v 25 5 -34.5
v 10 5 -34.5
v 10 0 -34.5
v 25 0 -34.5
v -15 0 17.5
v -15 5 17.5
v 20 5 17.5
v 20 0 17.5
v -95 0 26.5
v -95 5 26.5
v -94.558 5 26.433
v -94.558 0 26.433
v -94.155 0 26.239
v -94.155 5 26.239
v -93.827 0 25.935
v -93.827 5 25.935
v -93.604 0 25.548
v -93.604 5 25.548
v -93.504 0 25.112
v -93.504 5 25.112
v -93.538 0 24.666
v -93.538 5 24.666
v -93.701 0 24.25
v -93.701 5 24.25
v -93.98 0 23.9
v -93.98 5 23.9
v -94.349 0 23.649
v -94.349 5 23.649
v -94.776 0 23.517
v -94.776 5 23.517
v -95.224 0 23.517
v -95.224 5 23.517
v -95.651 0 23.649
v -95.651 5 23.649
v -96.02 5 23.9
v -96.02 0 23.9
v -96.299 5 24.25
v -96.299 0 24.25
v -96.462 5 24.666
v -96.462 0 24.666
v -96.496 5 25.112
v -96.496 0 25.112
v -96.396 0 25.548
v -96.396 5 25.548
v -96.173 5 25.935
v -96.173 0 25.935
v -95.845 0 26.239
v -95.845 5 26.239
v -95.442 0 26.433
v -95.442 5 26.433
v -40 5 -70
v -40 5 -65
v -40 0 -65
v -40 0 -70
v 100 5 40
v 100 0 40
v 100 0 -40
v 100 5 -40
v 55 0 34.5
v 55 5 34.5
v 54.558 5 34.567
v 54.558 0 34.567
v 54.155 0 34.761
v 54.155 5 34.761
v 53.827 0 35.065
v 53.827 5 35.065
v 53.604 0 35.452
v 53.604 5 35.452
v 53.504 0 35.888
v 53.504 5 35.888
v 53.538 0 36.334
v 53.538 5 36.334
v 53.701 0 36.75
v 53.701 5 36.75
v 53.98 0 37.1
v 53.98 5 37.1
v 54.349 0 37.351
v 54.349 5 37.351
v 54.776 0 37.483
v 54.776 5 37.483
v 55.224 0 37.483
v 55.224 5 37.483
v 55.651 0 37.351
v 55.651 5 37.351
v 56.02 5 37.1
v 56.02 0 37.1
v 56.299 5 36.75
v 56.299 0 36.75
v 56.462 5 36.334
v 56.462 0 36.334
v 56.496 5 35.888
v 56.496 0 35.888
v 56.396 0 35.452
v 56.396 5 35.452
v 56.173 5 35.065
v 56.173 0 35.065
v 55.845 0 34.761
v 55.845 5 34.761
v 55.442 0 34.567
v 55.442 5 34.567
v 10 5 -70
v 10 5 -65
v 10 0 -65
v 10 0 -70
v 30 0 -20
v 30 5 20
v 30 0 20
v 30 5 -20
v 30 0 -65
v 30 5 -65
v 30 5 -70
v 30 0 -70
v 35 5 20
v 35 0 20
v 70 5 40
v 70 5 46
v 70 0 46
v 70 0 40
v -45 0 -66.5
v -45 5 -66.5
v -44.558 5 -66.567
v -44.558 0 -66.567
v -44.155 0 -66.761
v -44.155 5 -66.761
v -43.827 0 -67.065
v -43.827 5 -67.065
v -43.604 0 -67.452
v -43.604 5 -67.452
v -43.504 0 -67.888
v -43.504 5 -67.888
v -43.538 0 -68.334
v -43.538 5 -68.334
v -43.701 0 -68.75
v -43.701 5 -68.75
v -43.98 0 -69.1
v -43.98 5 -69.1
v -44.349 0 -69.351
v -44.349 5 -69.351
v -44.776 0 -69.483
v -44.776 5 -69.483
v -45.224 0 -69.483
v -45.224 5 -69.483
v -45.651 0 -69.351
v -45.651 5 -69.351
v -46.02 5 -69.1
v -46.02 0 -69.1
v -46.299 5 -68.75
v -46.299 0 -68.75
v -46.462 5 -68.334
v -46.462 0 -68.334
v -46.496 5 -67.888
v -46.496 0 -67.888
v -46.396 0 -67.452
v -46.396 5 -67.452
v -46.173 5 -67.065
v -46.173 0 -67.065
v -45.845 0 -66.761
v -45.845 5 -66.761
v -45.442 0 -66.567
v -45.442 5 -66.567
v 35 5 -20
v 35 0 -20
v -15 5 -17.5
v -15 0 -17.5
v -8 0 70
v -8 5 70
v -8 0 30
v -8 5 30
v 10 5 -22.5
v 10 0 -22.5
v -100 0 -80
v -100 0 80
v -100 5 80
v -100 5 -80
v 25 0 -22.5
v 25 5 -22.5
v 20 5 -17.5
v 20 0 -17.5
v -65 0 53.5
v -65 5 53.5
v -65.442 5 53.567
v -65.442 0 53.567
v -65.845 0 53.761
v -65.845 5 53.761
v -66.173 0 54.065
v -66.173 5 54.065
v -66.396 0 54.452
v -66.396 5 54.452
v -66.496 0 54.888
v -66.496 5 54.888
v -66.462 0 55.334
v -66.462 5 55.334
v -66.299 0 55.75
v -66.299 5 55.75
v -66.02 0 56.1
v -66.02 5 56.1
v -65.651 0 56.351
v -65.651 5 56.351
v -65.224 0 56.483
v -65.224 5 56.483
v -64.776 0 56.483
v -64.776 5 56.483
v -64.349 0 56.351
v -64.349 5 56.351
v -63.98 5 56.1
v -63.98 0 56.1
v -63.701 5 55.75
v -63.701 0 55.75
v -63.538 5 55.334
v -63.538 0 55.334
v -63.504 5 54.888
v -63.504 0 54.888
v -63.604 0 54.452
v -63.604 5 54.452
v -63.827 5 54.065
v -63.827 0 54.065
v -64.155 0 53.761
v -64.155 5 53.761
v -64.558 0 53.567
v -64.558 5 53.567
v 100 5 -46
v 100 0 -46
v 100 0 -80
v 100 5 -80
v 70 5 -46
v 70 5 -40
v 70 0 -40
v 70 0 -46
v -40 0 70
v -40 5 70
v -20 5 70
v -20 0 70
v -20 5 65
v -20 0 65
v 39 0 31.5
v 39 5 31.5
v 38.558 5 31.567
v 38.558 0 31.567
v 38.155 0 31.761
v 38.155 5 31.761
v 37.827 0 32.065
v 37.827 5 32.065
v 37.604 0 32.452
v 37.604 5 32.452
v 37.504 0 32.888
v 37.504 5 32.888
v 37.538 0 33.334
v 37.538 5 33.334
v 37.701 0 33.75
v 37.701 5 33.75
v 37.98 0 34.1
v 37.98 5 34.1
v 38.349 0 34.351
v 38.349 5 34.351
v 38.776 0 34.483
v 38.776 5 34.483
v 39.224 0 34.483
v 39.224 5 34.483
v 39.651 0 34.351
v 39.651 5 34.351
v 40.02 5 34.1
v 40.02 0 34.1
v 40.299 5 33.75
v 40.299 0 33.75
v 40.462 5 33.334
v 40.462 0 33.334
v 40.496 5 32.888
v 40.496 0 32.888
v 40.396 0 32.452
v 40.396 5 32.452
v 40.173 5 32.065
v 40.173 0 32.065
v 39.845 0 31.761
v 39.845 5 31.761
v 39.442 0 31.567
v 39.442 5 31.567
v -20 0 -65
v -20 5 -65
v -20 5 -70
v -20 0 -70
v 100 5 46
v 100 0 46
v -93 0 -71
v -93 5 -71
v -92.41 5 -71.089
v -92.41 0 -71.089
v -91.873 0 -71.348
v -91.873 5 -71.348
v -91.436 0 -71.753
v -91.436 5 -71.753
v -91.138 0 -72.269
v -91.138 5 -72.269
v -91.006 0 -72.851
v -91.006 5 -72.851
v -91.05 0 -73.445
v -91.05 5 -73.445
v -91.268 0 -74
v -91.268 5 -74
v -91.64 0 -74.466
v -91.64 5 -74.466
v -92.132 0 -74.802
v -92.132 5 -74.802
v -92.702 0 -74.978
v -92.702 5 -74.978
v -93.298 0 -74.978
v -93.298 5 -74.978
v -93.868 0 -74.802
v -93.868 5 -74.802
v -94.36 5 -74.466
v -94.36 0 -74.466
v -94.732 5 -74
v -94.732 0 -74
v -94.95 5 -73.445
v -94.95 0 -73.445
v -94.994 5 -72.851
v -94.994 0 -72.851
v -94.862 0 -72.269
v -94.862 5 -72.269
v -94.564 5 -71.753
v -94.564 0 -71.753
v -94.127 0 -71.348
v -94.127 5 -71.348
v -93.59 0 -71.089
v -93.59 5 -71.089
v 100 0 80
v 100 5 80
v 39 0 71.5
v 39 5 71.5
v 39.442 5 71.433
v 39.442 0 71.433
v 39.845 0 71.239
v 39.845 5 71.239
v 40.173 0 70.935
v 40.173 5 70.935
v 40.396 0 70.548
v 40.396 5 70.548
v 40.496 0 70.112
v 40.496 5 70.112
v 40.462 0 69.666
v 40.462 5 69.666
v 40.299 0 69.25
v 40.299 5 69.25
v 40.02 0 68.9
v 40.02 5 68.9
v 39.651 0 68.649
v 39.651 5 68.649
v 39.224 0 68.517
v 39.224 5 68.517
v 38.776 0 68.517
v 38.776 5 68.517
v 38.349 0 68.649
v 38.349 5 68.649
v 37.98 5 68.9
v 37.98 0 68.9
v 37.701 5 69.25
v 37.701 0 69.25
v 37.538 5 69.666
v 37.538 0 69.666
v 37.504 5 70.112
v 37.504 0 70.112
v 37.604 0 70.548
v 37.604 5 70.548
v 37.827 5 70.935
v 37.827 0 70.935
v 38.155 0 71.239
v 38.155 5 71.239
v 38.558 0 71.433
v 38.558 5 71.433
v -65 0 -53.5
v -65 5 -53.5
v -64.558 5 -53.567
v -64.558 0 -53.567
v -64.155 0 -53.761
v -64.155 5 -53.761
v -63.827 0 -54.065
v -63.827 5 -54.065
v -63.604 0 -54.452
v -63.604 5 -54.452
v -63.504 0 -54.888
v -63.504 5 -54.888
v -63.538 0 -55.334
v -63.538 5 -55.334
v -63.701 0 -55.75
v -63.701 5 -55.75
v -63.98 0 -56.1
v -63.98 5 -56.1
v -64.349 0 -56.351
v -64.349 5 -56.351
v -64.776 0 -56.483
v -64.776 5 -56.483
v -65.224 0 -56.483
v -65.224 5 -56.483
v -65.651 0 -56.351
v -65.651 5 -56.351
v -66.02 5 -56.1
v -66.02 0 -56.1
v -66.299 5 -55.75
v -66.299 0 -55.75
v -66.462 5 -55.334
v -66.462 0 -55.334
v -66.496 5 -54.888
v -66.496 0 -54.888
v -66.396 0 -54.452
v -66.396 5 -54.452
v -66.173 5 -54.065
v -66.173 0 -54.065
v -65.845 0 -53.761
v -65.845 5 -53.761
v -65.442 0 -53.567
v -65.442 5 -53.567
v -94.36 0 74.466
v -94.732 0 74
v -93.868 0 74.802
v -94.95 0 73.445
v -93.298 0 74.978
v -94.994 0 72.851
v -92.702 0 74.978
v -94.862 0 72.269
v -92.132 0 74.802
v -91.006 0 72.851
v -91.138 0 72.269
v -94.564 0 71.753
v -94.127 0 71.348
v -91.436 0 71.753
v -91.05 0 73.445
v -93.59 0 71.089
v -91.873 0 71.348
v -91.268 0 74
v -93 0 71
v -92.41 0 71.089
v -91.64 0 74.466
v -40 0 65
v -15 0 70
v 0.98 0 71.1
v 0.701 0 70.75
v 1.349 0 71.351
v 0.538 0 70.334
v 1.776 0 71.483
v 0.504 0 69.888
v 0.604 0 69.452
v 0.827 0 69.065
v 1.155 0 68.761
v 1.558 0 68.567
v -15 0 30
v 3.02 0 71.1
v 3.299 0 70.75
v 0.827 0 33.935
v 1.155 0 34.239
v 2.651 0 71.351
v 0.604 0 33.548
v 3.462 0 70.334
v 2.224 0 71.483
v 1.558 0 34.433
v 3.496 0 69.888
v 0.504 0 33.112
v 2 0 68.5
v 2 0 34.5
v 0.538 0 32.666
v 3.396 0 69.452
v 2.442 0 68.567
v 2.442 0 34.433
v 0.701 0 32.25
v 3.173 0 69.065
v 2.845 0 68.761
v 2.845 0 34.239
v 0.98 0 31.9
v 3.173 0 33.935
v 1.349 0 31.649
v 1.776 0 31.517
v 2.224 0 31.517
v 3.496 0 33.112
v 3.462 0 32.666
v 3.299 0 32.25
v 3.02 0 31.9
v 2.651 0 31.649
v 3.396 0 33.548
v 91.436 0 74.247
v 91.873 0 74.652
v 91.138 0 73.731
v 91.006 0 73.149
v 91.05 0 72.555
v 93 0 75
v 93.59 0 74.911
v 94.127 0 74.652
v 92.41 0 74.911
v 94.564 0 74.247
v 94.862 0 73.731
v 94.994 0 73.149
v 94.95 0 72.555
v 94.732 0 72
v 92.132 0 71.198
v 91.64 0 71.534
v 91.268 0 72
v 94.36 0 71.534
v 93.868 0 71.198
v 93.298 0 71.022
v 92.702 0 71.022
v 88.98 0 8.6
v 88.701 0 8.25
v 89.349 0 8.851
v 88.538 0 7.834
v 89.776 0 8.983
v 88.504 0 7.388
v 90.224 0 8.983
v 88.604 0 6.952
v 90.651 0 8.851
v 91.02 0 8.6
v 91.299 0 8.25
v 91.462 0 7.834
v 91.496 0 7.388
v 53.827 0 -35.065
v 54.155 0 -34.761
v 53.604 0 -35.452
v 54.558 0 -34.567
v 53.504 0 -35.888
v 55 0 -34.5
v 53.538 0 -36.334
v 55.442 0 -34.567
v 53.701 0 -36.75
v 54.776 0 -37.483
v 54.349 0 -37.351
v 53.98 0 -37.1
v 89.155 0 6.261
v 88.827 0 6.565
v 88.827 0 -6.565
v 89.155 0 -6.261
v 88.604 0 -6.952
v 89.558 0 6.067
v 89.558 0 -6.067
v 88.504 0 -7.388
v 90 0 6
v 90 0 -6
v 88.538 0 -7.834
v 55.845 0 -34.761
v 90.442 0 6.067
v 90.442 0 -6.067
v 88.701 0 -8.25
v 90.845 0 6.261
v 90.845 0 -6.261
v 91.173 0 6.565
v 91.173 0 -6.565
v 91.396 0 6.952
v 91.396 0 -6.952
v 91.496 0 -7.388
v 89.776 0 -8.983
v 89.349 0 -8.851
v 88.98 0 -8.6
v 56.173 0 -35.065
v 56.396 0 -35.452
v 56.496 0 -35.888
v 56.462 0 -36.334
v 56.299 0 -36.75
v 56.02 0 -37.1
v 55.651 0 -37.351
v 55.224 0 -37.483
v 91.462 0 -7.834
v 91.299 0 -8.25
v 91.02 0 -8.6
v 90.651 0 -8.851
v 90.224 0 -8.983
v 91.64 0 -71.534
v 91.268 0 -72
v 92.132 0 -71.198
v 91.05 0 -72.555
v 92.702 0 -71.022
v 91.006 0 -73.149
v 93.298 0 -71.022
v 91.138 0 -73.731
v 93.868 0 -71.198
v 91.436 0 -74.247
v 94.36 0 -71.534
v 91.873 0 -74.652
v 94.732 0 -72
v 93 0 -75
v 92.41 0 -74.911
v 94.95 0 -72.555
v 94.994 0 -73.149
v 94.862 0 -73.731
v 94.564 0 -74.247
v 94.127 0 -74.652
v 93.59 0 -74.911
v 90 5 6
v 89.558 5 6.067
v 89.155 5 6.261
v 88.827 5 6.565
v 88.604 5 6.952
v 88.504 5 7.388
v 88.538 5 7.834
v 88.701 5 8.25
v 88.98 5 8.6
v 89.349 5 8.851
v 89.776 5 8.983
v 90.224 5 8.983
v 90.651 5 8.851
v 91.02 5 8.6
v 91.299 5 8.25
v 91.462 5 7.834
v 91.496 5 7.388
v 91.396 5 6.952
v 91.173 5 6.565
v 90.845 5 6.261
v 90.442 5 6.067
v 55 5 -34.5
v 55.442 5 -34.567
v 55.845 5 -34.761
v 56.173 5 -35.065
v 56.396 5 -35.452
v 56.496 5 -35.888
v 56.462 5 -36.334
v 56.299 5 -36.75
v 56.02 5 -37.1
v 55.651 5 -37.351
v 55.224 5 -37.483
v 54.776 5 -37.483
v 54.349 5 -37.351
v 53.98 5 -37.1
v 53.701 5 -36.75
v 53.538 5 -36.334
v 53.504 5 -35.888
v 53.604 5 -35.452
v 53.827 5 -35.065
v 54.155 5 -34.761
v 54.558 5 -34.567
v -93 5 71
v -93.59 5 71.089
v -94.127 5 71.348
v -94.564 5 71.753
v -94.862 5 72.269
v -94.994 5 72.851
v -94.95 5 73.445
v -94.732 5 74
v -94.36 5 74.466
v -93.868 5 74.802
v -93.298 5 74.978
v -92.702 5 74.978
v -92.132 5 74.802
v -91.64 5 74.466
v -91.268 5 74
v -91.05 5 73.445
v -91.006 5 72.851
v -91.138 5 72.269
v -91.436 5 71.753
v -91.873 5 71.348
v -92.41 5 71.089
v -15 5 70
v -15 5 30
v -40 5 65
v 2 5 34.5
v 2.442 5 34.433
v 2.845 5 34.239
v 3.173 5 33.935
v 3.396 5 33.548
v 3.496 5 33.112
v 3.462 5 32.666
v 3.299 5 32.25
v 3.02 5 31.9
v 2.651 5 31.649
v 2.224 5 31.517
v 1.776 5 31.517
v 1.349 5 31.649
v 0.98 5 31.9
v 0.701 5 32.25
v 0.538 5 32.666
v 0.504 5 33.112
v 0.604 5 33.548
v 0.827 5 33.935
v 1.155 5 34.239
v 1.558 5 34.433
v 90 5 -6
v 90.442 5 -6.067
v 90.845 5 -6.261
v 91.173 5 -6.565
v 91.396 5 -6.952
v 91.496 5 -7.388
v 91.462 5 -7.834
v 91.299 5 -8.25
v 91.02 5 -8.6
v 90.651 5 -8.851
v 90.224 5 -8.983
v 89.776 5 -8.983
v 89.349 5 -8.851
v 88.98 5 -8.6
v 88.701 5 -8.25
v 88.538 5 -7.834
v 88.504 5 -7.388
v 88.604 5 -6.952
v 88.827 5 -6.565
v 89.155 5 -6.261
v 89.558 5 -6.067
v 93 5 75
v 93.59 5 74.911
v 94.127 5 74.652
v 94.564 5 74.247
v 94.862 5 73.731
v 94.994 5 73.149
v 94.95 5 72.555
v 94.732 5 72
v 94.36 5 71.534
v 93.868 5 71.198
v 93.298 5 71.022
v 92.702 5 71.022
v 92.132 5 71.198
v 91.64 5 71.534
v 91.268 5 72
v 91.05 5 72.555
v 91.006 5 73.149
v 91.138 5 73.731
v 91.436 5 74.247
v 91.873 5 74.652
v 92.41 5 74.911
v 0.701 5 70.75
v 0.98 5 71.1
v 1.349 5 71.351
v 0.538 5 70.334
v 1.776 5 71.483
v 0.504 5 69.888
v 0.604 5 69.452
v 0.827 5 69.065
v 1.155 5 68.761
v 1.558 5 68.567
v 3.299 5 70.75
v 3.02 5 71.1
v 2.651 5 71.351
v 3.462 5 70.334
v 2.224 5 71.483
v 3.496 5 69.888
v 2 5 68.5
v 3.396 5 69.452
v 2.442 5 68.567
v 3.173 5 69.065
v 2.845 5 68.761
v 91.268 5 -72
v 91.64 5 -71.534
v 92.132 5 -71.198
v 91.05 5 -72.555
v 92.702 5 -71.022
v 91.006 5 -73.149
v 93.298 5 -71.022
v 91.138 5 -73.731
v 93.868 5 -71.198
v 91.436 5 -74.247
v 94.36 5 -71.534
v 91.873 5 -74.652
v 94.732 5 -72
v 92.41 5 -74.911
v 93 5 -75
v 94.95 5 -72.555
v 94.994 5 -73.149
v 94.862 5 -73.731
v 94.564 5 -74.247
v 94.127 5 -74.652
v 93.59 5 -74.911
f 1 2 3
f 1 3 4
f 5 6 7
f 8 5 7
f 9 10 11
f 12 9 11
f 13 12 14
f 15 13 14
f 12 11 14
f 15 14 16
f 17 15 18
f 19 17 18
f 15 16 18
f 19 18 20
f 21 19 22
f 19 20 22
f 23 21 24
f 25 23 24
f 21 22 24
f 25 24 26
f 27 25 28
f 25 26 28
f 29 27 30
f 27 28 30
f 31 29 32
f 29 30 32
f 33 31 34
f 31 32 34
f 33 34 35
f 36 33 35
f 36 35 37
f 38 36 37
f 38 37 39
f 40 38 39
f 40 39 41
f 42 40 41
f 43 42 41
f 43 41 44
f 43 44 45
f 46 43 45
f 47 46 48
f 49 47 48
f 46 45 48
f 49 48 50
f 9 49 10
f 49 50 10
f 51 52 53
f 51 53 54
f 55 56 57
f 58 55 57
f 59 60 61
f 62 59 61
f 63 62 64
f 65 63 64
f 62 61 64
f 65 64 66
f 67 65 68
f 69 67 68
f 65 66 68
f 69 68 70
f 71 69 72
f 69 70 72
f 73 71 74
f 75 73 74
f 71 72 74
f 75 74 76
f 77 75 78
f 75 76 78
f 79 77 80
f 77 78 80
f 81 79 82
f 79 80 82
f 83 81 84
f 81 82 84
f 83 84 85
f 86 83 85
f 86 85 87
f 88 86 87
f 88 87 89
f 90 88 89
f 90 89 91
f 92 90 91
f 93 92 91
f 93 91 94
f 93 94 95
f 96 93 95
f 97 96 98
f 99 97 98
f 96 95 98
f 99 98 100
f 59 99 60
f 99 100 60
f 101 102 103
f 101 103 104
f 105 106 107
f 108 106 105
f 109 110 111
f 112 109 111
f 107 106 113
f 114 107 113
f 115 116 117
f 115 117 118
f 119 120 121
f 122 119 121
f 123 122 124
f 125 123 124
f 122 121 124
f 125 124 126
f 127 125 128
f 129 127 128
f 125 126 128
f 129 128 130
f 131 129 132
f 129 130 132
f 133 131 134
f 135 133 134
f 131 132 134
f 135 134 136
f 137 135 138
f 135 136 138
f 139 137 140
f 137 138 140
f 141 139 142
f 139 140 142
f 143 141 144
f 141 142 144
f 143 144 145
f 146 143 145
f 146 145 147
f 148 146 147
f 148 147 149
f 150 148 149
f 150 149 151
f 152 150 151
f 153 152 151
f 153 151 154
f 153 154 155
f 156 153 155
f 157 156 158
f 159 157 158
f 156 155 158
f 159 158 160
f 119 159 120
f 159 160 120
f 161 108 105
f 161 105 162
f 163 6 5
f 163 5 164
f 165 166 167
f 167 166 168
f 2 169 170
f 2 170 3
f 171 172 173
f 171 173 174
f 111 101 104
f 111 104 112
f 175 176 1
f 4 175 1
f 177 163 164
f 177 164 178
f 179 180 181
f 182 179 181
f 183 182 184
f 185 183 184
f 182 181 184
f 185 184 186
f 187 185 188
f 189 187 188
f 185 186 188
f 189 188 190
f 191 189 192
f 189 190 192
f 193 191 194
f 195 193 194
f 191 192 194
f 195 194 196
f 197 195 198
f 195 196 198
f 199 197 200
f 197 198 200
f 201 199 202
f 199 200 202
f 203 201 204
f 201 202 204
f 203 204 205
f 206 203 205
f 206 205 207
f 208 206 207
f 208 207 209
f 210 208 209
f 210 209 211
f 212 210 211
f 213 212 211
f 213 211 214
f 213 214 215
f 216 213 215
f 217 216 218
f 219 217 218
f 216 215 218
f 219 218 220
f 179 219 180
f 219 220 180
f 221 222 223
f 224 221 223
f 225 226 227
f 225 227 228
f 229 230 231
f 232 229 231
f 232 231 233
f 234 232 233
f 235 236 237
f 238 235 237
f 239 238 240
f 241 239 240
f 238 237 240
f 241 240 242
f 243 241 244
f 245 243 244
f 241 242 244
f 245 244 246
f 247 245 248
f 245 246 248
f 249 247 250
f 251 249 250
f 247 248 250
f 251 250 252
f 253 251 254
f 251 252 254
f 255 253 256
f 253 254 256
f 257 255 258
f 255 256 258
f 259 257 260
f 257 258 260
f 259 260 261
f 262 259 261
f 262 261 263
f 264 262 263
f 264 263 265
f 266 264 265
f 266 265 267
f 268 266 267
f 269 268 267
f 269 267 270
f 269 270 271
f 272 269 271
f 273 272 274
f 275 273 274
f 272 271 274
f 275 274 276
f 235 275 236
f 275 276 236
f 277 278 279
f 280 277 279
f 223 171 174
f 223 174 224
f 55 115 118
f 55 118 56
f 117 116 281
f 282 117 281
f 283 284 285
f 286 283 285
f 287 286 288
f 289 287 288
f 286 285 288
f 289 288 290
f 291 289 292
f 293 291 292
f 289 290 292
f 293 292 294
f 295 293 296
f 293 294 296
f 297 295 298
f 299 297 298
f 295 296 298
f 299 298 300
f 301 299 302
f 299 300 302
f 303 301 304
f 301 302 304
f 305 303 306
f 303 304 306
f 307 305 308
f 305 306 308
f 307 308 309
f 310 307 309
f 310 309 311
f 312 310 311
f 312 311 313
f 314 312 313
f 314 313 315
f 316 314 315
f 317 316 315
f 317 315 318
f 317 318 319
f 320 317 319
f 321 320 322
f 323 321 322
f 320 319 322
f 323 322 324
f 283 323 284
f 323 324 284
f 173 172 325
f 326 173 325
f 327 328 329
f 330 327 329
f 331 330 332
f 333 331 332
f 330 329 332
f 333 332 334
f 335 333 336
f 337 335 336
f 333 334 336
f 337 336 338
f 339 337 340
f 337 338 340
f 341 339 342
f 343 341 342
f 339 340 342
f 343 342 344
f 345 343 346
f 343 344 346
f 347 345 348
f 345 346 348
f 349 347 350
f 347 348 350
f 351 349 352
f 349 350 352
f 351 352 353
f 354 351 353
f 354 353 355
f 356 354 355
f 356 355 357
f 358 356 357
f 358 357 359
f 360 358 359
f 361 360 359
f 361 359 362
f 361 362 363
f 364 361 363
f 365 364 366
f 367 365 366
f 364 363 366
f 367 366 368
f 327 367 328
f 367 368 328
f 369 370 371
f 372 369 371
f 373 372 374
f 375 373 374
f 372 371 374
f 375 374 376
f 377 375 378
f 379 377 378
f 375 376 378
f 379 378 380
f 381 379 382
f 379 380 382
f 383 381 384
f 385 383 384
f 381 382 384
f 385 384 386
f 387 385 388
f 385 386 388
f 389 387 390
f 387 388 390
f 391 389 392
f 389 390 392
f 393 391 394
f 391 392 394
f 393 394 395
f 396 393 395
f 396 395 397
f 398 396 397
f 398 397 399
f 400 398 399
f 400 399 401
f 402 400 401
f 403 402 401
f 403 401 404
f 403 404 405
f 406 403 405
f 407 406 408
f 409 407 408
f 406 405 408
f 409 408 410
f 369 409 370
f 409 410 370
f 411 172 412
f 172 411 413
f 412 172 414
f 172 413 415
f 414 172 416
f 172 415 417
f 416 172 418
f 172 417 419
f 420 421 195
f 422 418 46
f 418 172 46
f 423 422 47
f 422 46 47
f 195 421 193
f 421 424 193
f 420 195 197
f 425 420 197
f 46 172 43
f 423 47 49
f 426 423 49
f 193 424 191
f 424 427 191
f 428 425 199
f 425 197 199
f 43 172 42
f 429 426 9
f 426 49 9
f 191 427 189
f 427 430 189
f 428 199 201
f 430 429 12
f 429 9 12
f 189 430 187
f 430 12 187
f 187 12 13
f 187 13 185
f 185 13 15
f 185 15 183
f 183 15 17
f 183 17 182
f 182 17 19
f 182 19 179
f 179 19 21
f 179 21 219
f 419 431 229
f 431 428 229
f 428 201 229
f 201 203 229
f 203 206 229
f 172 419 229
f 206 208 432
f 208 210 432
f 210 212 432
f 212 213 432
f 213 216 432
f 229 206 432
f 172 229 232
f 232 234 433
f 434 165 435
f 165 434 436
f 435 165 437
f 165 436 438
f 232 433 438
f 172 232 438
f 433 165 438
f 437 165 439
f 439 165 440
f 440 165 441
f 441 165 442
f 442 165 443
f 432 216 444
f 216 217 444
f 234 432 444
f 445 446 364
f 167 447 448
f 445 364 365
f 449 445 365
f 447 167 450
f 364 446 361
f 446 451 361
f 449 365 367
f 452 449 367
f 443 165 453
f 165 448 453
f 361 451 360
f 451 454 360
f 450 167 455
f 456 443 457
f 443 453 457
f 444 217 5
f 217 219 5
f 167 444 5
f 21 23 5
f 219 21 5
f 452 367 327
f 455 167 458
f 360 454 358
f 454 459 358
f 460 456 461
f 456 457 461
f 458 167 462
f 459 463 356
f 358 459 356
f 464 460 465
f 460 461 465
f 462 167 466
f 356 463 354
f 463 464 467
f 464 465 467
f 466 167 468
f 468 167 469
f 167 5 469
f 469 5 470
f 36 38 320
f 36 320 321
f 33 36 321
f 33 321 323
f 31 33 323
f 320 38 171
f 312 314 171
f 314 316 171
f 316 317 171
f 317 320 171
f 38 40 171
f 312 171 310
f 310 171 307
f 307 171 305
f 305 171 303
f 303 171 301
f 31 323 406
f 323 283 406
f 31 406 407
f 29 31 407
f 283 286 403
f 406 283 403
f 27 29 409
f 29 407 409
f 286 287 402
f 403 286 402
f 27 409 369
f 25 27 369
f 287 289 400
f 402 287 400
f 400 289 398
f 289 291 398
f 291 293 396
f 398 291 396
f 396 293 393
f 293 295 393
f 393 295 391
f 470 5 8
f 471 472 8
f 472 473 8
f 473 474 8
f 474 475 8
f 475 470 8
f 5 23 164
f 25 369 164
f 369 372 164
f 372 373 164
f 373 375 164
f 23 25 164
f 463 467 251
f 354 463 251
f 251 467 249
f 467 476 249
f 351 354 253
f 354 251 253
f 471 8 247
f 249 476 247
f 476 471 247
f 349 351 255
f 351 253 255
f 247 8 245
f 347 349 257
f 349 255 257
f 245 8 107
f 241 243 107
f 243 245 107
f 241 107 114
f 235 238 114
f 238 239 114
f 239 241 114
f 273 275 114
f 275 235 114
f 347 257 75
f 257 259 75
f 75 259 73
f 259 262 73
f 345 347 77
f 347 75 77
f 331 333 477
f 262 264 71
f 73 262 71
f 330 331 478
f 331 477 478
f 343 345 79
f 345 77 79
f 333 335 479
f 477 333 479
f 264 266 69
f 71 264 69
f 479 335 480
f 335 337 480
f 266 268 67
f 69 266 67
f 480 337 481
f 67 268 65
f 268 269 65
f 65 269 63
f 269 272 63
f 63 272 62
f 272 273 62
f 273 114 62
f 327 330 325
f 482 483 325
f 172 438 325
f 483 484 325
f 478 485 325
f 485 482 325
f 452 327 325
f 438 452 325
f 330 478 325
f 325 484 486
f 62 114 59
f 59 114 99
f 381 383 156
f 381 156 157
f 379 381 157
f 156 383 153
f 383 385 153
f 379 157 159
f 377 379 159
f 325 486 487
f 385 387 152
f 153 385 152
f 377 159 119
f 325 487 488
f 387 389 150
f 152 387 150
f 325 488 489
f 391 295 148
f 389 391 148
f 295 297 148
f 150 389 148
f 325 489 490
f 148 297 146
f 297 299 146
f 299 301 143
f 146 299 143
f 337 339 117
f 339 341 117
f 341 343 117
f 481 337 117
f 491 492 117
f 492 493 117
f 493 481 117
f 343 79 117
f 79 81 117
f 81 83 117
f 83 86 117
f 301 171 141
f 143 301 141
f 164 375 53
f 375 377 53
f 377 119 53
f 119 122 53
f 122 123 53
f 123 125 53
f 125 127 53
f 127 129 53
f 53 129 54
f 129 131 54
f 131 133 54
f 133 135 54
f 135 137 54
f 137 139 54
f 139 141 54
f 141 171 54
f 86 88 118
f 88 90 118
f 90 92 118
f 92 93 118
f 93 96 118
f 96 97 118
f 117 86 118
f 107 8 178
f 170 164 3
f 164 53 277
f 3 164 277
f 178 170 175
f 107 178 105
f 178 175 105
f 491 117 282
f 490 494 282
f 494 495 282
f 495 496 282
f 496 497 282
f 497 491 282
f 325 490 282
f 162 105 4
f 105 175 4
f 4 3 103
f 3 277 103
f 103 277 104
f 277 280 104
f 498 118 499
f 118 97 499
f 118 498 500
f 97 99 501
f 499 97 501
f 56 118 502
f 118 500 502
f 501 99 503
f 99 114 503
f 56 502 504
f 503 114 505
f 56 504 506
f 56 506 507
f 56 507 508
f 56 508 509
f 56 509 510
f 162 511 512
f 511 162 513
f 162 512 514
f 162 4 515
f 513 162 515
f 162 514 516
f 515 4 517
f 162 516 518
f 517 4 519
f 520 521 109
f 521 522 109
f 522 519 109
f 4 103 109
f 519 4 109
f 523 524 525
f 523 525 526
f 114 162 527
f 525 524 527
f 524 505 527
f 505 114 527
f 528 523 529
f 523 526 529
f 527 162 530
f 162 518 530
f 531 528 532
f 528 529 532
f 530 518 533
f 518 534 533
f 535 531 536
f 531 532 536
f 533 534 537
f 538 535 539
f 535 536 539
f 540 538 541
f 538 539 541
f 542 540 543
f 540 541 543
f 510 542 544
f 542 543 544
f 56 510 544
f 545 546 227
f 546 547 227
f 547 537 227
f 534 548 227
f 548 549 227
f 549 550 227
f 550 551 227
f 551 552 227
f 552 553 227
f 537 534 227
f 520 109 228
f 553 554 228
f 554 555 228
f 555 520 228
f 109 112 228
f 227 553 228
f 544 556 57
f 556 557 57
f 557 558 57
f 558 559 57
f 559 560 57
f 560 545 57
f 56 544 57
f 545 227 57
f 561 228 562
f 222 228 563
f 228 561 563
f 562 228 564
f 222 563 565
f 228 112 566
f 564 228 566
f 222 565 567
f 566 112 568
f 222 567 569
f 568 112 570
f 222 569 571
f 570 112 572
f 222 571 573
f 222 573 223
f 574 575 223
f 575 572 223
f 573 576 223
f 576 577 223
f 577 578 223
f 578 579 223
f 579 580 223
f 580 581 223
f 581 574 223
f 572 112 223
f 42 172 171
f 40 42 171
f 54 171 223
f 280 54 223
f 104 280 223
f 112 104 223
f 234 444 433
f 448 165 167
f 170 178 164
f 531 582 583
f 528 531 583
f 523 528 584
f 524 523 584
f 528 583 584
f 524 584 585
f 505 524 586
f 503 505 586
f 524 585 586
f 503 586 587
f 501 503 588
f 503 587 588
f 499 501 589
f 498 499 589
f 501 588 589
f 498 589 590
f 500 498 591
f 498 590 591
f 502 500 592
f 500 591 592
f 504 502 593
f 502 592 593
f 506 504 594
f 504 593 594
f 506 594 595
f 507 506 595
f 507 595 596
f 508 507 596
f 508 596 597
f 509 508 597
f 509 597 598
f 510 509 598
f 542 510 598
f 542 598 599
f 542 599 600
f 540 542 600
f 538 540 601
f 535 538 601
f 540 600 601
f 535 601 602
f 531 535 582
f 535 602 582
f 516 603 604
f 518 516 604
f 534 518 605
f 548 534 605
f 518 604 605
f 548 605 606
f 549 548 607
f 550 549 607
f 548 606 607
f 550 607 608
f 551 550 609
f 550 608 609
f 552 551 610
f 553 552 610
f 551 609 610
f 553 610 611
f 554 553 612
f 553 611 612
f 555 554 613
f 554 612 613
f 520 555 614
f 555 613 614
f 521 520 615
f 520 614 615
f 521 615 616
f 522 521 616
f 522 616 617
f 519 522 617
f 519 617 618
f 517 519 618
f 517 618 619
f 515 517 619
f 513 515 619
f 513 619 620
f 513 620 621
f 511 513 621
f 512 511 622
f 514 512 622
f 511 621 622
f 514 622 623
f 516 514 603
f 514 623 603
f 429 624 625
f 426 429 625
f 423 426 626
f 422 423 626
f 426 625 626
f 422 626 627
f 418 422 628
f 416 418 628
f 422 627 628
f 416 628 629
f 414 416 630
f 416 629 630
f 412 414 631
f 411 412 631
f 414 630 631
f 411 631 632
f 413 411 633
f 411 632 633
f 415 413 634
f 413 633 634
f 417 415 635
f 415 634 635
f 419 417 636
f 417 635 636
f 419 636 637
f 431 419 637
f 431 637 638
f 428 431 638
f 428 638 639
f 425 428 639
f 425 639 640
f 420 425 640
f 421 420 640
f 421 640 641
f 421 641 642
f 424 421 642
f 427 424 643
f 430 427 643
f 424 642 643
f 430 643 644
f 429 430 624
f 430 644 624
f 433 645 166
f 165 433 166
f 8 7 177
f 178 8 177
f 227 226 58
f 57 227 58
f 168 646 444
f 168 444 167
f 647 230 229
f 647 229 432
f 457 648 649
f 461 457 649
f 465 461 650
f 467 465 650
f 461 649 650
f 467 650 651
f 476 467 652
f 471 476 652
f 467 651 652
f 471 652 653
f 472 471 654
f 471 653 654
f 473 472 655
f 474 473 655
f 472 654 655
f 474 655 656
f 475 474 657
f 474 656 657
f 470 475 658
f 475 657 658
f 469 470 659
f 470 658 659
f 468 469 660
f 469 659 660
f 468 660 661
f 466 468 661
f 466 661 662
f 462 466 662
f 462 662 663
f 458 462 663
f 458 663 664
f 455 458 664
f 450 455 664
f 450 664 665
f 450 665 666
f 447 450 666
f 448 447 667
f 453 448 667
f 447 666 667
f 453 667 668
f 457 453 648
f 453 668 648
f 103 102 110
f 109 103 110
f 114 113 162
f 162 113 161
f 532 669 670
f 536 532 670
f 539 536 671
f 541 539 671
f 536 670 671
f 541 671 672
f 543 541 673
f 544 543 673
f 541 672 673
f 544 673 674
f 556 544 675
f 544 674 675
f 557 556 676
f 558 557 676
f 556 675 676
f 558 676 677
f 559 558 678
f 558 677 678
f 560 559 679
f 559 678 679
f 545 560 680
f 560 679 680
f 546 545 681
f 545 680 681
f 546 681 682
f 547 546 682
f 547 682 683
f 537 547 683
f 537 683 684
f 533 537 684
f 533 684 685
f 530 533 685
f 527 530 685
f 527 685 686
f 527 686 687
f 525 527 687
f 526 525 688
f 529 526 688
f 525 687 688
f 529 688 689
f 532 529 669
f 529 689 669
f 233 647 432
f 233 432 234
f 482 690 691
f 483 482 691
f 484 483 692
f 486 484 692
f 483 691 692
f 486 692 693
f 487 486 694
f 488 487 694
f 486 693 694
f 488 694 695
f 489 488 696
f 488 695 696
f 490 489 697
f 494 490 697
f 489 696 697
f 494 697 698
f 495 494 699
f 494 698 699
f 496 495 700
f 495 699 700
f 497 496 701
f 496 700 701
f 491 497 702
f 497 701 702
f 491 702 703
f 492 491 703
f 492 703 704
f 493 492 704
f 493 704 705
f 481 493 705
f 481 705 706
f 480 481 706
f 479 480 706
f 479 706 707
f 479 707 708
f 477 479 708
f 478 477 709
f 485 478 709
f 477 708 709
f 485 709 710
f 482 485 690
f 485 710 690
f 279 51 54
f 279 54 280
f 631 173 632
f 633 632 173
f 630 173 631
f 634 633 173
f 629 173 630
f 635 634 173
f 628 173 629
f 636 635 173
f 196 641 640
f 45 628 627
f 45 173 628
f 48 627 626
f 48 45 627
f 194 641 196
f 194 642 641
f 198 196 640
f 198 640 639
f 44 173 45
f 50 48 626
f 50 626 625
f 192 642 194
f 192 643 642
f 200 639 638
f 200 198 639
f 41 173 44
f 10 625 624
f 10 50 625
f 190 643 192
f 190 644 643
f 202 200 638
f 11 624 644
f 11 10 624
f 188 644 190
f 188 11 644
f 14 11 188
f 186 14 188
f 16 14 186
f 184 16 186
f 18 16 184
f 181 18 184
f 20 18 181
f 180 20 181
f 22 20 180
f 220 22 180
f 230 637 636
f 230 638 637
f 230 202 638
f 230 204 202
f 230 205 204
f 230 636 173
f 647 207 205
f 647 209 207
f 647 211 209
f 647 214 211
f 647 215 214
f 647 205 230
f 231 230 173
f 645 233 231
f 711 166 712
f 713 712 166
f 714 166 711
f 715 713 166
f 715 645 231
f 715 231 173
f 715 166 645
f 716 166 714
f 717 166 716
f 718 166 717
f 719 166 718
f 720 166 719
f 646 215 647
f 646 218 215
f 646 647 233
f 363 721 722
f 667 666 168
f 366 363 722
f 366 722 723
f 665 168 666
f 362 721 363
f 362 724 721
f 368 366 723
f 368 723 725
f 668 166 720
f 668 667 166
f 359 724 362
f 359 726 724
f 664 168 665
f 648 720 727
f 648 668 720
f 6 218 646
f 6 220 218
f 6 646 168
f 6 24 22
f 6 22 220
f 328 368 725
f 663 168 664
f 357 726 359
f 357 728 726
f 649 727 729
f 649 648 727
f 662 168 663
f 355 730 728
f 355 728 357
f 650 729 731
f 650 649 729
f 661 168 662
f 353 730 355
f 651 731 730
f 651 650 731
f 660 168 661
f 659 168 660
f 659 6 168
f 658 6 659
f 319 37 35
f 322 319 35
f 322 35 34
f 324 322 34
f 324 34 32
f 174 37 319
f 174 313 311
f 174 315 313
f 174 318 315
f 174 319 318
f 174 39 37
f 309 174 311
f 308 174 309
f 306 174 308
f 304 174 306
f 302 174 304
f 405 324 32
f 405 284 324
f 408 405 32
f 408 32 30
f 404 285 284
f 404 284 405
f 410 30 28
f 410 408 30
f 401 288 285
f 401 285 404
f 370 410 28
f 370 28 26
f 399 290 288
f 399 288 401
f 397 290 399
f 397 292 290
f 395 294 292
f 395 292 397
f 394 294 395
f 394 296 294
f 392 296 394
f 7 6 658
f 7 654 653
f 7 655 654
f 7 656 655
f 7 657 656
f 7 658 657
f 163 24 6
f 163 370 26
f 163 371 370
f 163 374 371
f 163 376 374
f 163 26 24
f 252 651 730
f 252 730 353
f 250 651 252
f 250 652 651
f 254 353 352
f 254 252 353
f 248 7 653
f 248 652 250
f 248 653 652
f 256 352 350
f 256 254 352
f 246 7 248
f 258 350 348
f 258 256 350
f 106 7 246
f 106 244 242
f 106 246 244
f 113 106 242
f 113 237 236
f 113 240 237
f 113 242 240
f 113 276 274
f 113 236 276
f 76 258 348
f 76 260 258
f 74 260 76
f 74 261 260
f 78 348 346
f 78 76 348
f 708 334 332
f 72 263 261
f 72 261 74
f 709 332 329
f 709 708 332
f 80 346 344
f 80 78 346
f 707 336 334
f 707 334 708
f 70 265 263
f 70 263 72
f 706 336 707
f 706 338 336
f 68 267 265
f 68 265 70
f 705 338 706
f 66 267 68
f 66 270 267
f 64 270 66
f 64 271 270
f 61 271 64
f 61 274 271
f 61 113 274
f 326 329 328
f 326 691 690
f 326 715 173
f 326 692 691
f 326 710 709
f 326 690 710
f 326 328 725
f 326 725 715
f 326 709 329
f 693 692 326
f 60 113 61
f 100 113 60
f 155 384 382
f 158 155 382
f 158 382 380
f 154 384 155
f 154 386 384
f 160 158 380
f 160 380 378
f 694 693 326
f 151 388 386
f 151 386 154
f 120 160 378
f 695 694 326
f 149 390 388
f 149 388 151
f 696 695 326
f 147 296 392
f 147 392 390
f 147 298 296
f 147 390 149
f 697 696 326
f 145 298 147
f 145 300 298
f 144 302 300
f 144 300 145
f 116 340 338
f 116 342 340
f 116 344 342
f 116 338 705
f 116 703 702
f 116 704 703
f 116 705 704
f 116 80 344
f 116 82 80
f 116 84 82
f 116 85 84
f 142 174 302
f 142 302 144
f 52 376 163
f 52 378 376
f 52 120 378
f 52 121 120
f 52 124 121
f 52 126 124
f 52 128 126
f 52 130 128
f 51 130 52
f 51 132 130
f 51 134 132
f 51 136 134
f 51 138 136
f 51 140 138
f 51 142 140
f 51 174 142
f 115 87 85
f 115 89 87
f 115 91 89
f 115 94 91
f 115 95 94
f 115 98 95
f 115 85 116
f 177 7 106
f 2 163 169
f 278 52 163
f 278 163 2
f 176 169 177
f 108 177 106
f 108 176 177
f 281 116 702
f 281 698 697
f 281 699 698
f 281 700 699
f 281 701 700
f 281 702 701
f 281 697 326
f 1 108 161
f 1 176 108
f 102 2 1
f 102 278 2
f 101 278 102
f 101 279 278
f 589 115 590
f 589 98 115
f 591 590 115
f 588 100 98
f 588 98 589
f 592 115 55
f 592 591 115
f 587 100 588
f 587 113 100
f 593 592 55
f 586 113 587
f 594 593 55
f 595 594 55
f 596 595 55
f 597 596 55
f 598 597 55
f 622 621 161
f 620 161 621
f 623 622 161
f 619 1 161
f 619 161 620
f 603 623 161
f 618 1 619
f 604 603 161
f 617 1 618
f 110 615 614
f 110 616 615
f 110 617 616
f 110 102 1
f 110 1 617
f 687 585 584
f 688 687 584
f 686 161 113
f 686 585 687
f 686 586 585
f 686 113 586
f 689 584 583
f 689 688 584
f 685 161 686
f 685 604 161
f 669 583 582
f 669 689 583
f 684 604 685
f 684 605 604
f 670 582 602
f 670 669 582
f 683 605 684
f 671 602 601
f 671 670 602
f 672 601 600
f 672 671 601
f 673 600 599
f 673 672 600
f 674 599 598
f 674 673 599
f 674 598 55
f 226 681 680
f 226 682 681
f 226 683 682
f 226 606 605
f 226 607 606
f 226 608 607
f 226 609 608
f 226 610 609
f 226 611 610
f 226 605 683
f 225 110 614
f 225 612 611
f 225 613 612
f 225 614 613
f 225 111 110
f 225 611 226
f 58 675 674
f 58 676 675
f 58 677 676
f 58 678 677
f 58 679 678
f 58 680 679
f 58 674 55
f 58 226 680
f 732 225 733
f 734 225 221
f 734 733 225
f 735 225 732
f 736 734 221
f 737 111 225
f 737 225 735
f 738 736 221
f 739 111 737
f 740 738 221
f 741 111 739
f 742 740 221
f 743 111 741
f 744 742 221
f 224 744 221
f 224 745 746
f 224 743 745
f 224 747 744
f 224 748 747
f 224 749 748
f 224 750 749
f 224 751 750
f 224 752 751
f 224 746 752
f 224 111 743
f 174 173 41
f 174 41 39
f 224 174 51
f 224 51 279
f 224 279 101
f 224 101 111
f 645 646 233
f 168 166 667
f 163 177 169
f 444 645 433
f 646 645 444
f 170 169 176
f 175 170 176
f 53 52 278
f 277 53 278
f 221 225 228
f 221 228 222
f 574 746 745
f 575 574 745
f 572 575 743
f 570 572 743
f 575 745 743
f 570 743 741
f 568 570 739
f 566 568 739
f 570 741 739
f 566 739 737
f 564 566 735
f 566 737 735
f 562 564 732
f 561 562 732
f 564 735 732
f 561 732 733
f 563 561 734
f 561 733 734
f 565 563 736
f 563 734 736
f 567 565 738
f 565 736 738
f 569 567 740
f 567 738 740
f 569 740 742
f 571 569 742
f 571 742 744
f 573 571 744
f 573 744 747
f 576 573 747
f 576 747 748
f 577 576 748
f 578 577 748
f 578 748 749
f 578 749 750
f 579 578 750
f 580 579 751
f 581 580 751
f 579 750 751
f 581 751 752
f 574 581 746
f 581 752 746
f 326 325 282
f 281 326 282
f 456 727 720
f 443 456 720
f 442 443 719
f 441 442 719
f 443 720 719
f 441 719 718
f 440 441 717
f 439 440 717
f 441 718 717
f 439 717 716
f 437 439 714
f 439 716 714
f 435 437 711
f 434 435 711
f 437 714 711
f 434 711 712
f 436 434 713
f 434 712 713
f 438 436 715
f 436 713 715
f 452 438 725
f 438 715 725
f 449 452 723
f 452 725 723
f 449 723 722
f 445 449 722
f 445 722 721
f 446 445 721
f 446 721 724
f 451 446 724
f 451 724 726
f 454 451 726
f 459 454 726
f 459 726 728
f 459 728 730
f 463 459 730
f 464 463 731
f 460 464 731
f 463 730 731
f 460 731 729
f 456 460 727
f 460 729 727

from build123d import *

# Parameters (mm, degrees)
SKETCH1_W           = 200
SKETCH1_H           = 160
BOSS_EXTRUDE1_DEPTH = 5
SKETCH2_R           = 2
CUT_EXTRUDE1_DEPTH  = 5
SKETCH3_R           = 1.5
CUT_EXTRUDE4_DEPTH  = 5
SKETCH4_R           = 1.5
CUT_EXTRUDE5_DEPTH  = 5
SKETCH5_W           = 35
SKETCH5_H           = 35
CUT_EXTRUDE6_DEPTH  = 5
SKETCH7_W           = 7
SKETCH7_H           = 40
SKETCH7_W_2         = 5
SKETCH7_W_3         = 20
SKETCH7_H_2         = 5
CUT_EXTRUDE7_DEPTH  = 5
SKETCH8_W           = 15
SKETCH8_H           = 12
SKETCH8_W_2         = 30
SKETCH8_H_2         = 6
CUT_EXTRUDE8_DEPTH  = 5
SKETCH9_W           = 20
SKETCH9_H           = 5
CUT_EXTRUDE9_DEPTH  = 5
SKETCH10_R          = 1.5
CUT_EXTRUDE10_DEPTH = 5
SKETCH11_R          = 1.5
CUT_EXTRUDE11_DEPTH = 5
SKETCH12_R          = 1.5
CUT_EXTRUDE12_DEPTH = 5


with BuildPart() as part:
    # Sketch1 → Boss-Extrude1 (new body)
    with BuildSketch(Plane(origin=(0, 0, 0), x_dir=(1, 0, 0), z_dir=(0, 1, 0))):
        Rectangle(SKETCH1_W, SKETCH1_H)
    extrude(amount=BOSS_EXTRUDE1_DEPTH)

    # Sketch2 → Cut-Extrude1 (cut)
    with BuildSketch(Plane(origin=(0, 5, 0), x_dir=(1, 0, 0), z_dir=(0, 1, 0))):
        with Locations(Location((-93, 73, 0), (0, 0, 270))):
            Circle(SKETCH2_R)
        with Locations(Location((93, 73, 0), (0, 0, 90))):
            Circle(SKETCH2_R)
        with Locations(Location((93, -73, 0), (0, 0, 270))):
            Circle(SKETCH2_R)
        with Locations(Location((-93, -73, 0), (0, 0, 90))):
            Circle(SKETCH2_R)
    extrude(amount=-CUT_EXTRUDE1_DEPTH, mode=Mode.SUBTRACT)

    # Sketch3 → Cut-Extrude4 (cut)
    with BuildSketch(Plane(origin=(0, 5, 0), x_dir=(1, 0, 0), z_dir=(0, 1, 0))):
        with Locations(Location((90, 7.5, 0), (0, 0, 270))):
            Circle(SKETCH3_R)
        with Locations(Location((90, -7.5, 0), (0, 0, 90))):
            Circle(SKETCH3_R)
    extrude(amount=-CUT_EXTRUDE4_DEPTH, mode=Mode.SUBTRACT)

    # Sketch4 → Cut-Extrude5 (cut)
    with BuildSketch(Plane(origin=(0, 5, 0), x_dir=(1, 0, 0), z_dir=(0, 1, 0))):
        with Locations(Location((55, 36, 0), (0, 0, 270))):
            Circle(SKETCH4_R)
        with Locations(Location((55, -36, 0), (0, 0, 90))):
            Circle(SKETCH4_R)
    extrude(amount=-CUT_EXTRUDE5_DEPTH, mode=Mode.SUBTRACT)

    # Sketch5 → Cut-Extrude6 (cut)
    with BuildSketch(Plane(origin=(0, 5, 0), x_dir=(1, 0, 0), z_dir=(0, 1, 0))):
        with Locations((2.5, 0)):
            Rectangle(SKETCH5_W, SKETCH5_H)
    extrude(amount=-CUT_EXTRUDE6_DEPTH, mode=Mode.SUBTRACT)

    # Sketch7 → Cut-Extrude7 (cut)
    with BuildSketch(Plane(origin=(0, 5, 0), x_dir=(1, 0, 0), z_dir=(0, 1, 0))):
        with Locations((-11.5, -50)):
            Rectangle(SKETCH7_W, SKETCH7_H)
        with Locations((32.5, 0)):
            Rectangle(SKETCH7_W_2, SKETCH7_H)
        with Locations((-30, 67.5)):
            Rectangle(SKETCH7_W_3, SKETCH7_H_2)
        with Locations((-30, -67.5)):
            Rectangle(SKETCH7_W_3, SKETCH7_H_2)
    extrude(amount=-CUT_EXTRUDE7_DEPTH, mode=Mode.SUBTRACT)

    # Sketch8 → Cut-Extrude8 (cut)
    with BuildSketch(Plane(origin=(0, 5, 0), x_dir=(1, 0, 0), z_dir=(0, 1, 0))):
        with Locations((17.5, 28.5)):
            Rectangle(SKETCH8_W, SKETCH8_H)
        with Locations((85, 43)):
            Rectangle(SKETCH8_W_2, SKETCH8_H_2)
        with Locations((85, -43)):
            Rectangle(SKETCH8_W_2, SKETCH8_H_2)
    extrude(amount=-CUT_EXTRUDE8_DEPTH, mode=Mode.SUBTRACT)

    # Sketch9 → Cut-Extrude9 (cut)
    with BuildSketch(Plane(origin=(0, 5, 0), x_dir=(1, 0, 0), z_dir=(0, 1, 0))):
        with Locations((20, 67.5)):
            Rectangle(SKETCH9_W, SKETCH9_H)
    extrude(amount=-CUT_EXTRUDE9_DEPTH, mode=Mode.SUBTRACT)

    # Sketch10 → Cut-Extrude10 (cut)
    with BuildSketch(Plane(origin=(0, 5, 0), x_dir=(1, 0, 0), z_dir=(0, 1, 0))):
        with Locations(Location((-95, -25, 0), (0, 0, 270))):
            Circle(SKETCH10_R)
        with Locations(Location((-45, 68, 0), (0, 0, 270))):
            Circle(SKETCH10_R)
    extrude(amount=-CUT_EXTRUDE10_DEPTH, mode=Mode.SUBTRACT)

    # Sketch11 → Cut-Extrude11 (cut)
    with BuildSketch(Plane(origin=(0, 5, 0), x_dir=(1, 0, 0), z_dir=(0, 1, 0))):
        with Locations(Location((2, -33, 0), (0, 0, 270))):
            Circle(SKETCH11_R)
        with Locations(Location((2, -70, 0), (0, 0, 90))):
            Circle(SKETCH11_R)
        with Locations(Location((39, -70, 0), (0, 0, 270))):
            Circle(SKETCH11_R)
        with Locations(Location((39, -33, 0), (0, 0, 90))):
            Circle(SKETCH11_R)
    extrude(amount=-CUT_EXTRUDE11_DEPTH, mode=Mode.SUBTRACT)

    # Sketch12 → Cut-Extrude12 (cut)
    with BuildSketch(Plane(origin=(0, 5, 0), x_dir=(1, 0, 0), z_dir=(0, 1, 0))):
        with Locations(Location((-65, 55, 0), (0, 0, 270))):
            Circle(SKETCH12_R)
        with Locations(Location((-65, -55, 0), (0, 0, 90))):
            Circle(SKETCH12_R)
    extrude(amount=-CUT_EXTRUDE12_DEPTH, mode=Mode.SUBTRACT)


solid = part.part
